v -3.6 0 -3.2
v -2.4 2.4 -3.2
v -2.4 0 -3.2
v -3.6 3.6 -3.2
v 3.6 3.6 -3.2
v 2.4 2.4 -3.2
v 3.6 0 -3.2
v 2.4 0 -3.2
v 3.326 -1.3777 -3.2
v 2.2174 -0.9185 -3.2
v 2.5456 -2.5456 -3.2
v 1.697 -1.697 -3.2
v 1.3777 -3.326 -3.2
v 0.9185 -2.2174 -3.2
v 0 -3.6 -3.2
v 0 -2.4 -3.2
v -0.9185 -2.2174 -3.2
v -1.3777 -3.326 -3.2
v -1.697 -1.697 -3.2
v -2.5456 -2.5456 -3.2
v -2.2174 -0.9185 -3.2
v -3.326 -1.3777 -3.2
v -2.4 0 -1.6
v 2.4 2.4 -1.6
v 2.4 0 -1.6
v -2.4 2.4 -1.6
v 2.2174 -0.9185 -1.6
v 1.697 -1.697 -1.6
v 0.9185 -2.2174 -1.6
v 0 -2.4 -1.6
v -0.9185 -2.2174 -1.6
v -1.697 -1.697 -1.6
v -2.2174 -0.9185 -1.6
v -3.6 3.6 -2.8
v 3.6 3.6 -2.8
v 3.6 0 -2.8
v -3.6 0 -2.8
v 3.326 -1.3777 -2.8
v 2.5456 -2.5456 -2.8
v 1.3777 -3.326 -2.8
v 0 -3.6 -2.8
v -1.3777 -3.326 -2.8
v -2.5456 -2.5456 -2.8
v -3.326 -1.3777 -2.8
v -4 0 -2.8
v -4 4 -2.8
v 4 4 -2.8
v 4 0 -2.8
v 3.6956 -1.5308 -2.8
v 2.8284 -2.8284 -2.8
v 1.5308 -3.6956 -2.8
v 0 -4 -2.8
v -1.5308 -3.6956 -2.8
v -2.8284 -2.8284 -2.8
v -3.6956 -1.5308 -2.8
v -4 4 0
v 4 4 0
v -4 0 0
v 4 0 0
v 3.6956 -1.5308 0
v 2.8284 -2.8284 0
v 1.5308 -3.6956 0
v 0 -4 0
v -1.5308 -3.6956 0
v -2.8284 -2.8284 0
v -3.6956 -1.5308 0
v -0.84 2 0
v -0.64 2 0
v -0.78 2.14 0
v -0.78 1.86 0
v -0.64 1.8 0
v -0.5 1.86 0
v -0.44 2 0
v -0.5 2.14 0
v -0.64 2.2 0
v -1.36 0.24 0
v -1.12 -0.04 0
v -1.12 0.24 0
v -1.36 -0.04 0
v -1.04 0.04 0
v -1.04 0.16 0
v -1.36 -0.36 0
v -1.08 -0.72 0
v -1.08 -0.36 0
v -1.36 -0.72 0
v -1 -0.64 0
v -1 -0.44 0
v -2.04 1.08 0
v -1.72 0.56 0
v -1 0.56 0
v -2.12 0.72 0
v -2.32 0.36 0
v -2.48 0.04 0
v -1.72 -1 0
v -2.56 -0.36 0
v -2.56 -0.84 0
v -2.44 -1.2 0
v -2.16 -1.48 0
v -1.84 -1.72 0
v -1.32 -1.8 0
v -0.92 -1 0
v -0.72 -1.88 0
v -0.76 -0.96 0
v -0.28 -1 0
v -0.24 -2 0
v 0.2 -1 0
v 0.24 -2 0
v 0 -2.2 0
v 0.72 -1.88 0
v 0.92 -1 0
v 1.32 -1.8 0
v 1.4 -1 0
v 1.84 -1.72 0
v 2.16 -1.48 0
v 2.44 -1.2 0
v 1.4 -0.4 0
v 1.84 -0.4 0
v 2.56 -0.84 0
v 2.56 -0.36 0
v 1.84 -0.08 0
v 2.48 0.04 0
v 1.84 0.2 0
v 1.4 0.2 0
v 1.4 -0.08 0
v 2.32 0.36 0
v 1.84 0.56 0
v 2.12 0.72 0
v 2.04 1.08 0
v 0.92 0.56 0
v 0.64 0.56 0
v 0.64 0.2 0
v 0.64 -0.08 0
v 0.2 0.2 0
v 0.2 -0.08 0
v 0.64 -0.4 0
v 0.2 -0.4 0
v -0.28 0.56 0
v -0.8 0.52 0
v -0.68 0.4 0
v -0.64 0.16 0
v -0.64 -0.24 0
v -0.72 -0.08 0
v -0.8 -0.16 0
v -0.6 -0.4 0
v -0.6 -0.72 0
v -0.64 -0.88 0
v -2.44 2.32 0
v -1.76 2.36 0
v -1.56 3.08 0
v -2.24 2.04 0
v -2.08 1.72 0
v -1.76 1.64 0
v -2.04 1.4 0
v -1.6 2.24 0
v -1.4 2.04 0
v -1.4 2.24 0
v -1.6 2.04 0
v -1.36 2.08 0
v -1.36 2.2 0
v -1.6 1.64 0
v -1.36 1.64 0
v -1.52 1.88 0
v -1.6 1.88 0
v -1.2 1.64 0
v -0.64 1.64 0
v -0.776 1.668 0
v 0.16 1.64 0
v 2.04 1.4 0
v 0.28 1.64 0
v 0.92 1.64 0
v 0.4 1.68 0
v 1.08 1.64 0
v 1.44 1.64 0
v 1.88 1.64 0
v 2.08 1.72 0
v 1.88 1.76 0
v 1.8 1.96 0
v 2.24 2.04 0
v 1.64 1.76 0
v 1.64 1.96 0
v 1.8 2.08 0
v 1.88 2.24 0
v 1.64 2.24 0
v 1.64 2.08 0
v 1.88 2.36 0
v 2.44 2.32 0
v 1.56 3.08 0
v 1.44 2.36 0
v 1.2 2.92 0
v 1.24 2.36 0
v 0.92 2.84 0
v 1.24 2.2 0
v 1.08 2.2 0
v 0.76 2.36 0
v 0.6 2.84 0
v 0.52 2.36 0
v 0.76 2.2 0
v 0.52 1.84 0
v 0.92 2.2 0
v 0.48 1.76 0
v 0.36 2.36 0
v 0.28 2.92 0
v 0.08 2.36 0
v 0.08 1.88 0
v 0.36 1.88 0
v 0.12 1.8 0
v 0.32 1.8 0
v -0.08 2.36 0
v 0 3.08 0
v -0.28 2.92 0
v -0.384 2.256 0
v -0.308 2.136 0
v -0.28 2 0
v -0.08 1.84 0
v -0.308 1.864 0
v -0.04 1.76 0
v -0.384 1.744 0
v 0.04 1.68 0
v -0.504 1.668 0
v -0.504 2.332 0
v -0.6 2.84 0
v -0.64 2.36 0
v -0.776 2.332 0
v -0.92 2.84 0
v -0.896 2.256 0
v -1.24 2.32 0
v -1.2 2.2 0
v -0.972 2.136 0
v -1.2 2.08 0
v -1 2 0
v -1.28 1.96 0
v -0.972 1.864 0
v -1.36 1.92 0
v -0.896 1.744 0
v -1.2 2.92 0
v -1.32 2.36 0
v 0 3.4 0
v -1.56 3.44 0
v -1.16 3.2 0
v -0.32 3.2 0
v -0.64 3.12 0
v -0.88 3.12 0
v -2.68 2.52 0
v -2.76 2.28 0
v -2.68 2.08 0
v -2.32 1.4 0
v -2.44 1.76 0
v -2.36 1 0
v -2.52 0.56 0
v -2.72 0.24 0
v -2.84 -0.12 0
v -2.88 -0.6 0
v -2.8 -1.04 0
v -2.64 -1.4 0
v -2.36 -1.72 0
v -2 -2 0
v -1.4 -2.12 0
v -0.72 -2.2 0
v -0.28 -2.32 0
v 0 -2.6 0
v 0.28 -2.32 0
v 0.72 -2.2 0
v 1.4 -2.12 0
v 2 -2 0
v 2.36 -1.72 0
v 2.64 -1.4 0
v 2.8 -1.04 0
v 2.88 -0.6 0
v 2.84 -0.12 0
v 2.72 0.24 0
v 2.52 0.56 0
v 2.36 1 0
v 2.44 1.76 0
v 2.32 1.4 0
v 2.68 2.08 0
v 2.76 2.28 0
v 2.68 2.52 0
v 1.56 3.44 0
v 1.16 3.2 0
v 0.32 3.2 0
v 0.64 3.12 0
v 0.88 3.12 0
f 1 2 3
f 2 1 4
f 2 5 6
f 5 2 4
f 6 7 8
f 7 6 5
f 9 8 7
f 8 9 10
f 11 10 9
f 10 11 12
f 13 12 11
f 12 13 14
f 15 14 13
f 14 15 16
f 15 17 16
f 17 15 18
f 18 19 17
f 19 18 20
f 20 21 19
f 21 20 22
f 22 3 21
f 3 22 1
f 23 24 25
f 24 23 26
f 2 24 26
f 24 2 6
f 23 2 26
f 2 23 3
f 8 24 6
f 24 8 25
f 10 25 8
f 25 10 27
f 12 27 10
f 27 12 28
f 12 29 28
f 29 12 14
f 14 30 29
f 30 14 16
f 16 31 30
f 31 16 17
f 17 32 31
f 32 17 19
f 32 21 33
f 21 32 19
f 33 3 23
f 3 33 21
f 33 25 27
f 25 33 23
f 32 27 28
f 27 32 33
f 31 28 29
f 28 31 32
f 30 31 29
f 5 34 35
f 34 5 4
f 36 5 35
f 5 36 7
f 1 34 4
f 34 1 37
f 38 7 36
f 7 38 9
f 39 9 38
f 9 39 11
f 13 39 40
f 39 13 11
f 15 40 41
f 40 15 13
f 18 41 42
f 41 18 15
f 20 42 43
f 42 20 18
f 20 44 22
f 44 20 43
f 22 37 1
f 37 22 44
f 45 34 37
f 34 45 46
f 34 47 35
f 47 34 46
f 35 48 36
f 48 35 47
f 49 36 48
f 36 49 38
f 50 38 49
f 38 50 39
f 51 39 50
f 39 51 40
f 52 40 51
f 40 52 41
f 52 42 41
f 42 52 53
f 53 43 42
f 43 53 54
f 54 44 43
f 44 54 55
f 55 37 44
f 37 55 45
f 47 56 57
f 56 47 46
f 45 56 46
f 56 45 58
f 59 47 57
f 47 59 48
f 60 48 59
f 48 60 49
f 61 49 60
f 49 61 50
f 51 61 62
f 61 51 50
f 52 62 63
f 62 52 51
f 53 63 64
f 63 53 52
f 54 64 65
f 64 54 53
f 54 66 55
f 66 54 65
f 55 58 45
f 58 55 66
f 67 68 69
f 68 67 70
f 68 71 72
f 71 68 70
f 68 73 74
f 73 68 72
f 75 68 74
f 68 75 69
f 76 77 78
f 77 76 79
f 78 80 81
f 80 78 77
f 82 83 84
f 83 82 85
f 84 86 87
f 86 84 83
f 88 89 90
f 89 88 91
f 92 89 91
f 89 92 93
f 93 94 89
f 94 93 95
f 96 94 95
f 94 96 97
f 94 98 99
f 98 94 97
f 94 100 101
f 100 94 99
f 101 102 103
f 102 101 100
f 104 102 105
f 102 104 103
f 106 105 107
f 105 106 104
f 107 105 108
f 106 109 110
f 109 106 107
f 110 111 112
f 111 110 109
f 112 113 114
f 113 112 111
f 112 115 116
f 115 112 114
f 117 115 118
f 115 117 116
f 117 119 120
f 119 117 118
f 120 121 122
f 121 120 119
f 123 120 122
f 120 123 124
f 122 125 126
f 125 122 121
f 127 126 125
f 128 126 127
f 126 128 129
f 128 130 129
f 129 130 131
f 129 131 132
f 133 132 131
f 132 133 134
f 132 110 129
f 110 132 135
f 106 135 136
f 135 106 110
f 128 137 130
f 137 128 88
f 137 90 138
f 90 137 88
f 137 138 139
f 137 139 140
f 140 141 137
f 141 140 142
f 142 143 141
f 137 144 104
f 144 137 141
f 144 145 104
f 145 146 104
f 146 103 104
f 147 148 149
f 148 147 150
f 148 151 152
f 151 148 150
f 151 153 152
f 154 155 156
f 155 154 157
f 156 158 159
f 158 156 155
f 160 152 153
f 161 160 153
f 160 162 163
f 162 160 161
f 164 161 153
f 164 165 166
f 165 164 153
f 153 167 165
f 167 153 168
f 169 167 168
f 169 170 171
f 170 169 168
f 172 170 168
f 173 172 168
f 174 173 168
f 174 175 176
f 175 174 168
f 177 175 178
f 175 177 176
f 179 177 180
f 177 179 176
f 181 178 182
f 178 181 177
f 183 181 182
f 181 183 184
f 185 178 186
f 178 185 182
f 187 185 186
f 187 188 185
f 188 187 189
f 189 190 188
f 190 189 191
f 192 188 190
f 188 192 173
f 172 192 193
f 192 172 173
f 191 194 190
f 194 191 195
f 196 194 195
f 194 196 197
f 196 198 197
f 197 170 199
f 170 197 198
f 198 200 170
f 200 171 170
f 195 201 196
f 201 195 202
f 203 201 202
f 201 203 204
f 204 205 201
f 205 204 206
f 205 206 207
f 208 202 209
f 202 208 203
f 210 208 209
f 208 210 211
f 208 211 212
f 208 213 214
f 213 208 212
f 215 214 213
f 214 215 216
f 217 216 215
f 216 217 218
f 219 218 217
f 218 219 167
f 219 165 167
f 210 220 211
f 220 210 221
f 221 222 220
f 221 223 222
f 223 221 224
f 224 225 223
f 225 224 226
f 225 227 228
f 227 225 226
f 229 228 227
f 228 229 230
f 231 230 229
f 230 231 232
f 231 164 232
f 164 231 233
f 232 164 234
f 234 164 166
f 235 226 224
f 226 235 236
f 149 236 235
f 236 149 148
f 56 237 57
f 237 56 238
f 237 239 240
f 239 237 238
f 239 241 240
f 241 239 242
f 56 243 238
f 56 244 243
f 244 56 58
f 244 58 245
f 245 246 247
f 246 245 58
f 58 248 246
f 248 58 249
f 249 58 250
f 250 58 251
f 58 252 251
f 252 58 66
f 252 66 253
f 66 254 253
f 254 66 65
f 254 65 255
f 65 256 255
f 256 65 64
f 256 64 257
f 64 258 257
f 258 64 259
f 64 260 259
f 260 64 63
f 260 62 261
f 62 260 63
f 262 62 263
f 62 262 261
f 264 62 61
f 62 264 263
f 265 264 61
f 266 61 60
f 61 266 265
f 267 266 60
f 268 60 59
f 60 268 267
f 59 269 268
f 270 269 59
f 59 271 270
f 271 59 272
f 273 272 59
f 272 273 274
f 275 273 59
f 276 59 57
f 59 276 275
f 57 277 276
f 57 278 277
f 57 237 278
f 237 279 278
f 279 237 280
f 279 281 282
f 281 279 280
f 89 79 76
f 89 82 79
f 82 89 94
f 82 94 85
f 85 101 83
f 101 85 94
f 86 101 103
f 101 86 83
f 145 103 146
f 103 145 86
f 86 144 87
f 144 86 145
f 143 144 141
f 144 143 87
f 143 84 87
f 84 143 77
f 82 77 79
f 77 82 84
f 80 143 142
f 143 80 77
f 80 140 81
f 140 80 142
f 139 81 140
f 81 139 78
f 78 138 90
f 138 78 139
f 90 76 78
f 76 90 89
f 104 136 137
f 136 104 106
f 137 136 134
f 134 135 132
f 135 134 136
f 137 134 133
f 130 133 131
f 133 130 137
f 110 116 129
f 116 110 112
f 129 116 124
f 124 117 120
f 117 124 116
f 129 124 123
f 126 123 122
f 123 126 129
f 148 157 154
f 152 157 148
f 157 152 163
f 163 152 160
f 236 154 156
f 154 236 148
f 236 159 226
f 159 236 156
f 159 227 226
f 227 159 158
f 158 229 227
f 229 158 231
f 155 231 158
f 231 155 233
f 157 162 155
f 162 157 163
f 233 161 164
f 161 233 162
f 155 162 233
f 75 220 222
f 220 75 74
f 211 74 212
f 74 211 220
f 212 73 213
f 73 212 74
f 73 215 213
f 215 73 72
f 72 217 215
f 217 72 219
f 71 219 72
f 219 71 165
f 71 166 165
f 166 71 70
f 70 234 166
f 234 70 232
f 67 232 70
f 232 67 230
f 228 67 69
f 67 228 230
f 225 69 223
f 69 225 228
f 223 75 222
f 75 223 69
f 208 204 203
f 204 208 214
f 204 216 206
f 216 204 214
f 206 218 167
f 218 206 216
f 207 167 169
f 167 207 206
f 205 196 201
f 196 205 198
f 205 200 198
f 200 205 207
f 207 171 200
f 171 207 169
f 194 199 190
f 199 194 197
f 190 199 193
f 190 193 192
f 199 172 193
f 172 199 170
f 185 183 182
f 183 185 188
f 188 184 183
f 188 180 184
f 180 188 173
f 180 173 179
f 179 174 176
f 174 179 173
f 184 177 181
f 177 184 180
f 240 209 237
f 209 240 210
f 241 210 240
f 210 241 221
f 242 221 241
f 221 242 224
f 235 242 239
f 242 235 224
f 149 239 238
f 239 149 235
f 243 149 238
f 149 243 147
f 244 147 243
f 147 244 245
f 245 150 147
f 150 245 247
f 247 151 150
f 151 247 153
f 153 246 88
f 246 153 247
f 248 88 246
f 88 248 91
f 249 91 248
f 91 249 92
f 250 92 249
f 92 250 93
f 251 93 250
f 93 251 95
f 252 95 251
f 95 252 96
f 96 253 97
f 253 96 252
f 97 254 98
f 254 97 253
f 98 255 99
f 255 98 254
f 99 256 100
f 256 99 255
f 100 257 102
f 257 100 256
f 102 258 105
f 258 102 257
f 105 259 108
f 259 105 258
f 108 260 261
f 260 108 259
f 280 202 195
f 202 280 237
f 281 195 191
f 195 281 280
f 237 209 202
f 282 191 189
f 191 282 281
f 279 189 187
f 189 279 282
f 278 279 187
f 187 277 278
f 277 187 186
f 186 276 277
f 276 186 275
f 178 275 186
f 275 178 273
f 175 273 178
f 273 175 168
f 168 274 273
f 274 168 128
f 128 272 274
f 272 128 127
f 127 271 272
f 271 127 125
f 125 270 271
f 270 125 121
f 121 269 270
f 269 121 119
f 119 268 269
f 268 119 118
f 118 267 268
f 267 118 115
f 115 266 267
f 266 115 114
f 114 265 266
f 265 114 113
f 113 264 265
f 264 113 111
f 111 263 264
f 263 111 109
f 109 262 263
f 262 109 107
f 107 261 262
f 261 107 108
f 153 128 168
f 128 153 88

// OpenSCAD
use <../lib.scad>
use <s/24246pt0s01.scad>
use <s/24246pt0s02.scad>
use <s/24246s02.scad>
function ldraw_lib__24246pt0() = [
// 0 Tile  1 x  1 with Rounded End with White Highway Sign, Orange Outline and "ROUTE BFF" Pattern
// 0 Name: 24246pt0.dat
// 0 Author: Takeshi Takahashi [RainbowDolphin]
// 0 !LDRAW_ORG Part UPDATE 2023-05
// 0 !LICENSE Licensed under CC BY 4.0 : see CAreadme.txt
// 
// 0 BFC CERTIFY CCW
  [0,"BFC","CERTIFY"],
  [0,"BFC","CCW"],
// 
// 0 !KEYWORDS adventure, Bricklink 24246pb012, Dots, Rebrickable 24246pr0010
// 0 !KEYWORDS Set 41918
// 
// 0 !HISTORY 2023-10-31 [OrionP] Official Update 2023-05
// 
// 
// 1 16 0 0 0 1 0 0 0 1 0 0 0 1 s\24246s02.dat
  [1,16,0,0,0,1,0,0,0,1,0,0,0,1, ldraw_lib__s__24246s02()],
// 1 16 0 0 0 1 0 0 0 1 0 0 0 1 s\24246pt0s01.dat
  [1,16,0,0,0,1,0,0,0,1,0,0,0,1, ldraw_lib__s__24246pt0s01()],
// 1 25 0 0 0 1 0 0 0 1 0 0 0 1 s\24246pt0s02.dat
  [1,25,0,0,0,1,0,0,0,1,0,0,0,1, ldraw_lib__s__24246pt0s02()],
// 
];
module ldraw_lib__24246pt0(step=0, col=false, unit=2/5, alt=false, line=0.2, solid=!$preview)
    makepoly(ldraw_lib__24246pt0(), step=step, col=col, unit=unit, alt=alt, line=line, solid=solid);
ldraw_lib__24246pt0(line=0.2);
